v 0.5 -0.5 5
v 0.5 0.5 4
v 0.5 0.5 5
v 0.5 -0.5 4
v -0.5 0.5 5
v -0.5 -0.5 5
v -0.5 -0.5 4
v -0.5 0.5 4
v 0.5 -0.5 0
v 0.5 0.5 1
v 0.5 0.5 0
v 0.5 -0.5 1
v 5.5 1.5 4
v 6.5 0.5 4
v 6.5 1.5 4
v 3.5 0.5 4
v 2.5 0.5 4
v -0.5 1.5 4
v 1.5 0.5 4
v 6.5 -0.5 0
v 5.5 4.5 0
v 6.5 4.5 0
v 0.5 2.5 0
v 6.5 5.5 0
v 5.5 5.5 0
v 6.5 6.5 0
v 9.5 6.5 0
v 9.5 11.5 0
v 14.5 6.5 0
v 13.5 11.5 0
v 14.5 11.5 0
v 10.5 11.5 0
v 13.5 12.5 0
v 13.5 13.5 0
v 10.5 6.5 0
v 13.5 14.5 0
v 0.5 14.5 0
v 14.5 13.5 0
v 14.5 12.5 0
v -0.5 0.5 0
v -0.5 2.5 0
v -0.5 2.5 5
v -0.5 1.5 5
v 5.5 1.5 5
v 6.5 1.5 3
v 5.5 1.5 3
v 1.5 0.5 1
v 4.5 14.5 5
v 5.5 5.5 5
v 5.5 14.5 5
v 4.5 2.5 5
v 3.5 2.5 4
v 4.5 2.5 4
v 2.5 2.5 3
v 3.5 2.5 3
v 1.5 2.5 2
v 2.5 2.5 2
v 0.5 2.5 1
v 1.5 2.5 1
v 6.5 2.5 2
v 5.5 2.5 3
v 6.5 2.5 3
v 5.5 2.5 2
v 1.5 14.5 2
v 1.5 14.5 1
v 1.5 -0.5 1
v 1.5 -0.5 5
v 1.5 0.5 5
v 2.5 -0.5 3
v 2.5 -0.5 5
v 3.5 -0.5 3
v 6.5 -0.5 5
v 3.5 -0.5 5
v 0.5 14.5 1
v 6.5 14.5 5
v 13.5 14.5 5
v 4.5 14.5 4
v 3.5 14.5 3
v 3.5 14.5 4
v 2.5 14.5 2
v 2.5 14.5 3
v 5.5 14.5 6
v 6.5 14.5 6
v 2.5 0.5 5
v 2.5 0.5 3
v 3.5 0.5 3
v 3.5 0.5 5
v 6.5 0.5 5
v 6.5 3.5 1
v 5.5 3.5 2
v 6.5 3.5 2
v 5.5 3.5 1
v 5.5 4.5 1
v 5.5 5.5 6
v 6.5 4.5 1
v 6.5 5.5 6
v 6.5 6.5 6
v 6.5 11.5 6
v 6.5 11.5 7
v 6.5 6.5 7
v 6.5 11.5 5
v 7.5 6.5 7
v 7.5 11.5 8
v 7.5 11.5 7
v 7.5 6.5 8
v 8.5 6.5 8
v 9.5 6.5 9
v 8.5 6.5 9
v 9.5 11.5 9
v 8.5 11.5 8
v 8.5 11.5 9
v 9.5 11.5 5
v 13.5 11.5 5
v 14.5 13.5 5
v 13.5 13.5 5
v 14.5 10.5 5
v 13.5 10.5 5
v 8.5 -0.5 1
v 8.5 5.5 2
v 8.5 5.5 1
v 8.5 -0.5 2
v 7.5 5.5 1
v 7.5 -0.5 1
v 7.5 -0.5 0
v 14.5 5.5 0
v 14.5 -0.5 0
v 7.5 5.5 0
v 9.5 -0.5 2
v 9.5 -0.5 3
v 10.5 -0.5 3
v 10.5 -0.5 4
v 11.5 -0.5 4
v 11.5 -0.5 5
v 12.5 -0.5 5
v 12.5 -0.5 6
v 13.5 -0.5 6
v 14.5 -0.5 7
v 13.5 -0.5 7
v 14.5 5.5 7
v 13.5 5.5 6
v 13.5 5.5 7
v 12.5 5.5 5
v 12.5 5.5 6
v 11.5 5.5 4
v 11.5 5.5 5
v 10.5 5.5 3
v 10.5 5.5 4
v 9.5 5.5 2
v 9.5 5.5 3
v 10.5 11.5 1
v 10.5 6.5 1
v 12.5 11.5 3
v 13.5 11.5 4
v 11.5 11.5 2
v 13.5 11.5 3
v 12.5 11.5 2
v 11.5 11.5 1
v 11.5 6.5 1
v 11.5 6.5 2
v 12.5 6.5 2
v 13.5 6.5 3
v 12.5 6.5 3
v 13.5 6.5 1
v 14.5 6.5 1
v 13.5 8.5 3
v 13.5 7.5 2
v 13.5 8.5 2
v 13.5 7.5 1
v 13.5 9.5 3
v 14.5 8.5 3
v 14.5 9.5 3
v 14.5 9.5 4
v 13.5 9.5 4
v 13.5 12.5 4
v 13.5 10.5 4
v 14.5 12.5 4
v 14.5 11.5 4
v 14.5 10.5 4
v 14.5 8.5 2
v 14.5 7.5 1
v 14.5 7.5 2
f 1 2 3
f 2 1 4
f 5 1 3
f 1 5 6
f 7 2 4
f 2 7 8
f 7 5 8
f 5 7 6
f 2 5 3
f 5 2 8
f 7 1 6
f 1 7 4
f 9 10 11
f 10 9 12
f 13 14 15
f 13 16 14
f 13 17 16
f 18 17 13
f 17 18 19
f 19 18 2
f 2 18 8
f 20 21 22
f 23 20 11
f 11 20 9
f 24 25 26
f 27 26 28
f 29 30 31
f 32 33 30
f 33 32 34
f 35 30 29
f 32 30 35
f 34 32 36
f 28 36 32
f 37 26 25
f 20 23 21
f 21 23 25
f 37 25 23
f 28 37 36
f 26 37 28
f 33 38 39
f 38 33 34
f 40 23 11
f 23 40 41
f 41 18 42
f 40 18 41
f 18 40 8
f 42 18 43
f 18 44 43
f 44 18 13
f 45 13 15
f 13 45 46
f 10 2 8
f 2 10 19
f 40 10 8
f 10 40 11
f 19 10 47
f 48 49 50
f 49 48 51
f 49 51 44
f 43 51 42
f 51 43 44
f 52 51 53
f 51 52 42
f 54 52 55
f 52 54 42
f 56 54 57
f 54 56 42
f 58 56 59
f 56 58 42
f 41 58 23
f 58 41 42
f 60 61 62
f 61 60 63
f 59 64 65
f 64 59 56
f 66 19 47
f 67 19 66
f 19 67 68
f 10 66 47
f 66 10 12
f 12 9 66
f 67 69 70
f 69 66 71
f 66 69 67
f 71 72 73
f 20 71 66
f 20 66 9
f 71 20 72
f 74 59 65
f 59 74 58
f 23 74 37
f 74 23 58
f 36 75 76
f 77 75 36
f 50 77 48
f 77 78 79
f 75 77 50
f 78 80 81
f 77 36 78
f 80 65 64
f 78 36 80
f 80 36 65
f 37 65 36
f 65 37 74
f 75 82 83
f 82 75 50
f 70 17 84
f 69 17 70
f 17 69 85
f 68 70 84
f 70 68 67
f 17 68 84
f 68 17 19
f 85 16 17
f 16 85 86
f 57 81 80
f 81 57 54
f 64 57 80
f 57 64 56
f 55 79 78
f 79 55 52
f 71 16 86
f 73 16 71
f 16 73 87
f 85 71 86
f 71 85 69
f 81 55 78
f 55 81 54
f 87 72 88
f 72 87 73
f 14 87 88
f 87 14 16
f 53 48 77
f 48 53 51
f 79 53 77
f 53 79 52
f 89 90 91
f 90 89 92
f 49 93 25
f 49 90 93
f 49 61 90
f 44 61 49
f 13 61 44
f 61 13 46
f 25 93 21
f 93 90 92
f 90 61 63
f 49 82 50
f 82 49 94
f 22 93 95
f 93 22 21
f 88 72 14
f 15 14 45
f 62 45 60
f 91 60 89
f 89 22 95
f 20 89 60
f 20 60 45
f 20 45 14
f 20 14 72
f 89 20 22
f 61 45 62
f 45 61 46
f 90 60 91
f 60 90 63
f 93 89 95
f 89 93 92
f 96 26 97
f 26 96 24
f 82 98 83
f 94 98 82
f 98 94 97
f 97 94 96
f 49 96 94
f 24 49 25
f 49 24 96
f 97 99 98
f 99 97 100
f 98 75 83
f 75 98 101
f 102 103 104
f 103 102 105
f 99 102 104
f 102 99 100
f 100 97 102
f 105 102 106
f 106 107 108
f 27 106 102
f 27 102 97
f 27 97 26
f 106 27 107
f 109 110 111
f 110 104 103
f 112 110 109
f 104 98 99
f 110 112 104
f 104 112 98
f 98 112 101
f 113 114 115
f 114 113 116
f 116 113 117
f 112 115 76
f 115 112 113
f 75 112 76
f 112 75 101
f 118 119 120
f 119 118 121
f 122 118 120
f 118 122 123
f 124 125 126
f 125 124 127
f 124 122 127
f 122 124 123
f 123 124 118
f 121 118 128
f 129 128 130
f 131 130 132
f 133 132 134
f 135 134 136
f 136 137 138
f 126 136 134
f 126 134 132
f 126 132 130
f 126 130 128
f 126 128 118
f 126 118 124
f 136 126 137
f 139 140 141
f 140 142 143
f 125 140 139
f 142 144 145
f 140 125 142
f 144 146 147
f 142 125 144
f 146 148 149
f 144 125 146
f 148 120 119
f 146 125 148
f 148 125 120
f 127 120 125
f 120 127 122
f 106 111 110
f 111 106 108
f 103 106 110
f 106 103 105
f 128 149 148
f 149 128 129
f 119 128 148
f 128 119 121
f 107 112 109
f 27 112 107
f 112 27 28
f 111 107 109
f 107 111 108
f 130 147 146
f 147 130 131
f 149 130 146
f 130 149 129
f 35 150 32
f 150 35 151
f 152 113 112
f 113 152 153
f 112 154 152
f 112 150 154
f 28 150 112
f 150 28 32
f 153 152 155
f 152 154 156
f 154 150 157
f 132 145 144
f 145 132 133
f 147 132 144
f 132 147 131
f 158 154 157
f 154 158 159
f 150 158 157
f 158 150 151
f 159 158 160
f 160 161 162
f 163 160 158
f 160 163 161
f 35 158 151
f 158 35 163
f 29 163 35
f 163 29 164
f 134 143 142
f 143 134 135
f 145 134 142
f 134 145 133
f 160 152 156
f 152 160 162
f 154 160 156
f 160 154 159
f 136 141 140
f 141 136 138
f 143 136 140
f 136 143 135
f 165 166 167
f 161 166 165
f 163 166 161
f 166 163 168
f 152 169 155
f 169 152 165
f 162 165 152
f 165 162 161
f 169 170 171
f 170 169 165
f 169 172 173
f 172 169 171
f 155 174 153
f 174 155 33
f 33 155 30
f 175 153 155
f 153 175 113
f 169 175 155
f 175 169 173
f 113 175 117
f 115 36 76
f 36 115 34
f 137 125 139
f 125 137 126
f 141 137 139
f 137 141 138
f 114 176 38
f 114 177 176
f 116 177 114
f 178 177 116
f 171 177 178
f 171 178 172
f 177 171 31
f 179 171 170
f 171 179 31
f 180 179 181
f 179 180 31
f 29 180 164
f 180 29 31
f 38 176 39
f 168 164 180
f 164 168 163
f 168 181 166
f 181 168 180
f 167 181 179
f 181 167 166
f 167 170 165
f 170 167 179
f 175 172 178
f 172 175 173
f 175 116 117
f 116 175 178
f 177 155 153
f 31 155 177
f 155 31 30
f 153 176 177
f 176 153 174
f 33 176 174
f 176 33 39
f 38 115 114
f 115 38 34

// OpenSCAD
union() {
    translate([0, 0, 4.5]) color([1, 0, 0]) cube([1, 1, 1], center=true);
    translate([0, 1, 2.0]) cube([1, 1, 4], center=true);
    translate([0, 2, 2.5]) cube([1, 1, 5], center=true);
    translate([1, 0, 0.5]) cube([1, 1, 1], center=true);
    translate([1, 1, 2.0]) cube([1, 1, 4], center=true);
    translate([1, 2, 2.5]) cube([1, 1, 5], center=true);
    translate([1, 3, 0.5]) cube([1, 1, 1], center=true);
    translate([1, 4, 0.5]) cube([1, 1, 1], center=true);
    translate([1, 5, 0.5]) cube([1, 1, 1], center=true);
    translate([1, 6, 0.5]) cube([1, 1, 1], center=true);
    translate([1, 7, 0.5]) cube([1, 1, 1], center=true);
    translate([1, 8, 0.5]) cube([1, 1, 1], center=true);
    translate([1, 9, 0.5]) cube([1, 1, 1], center=true);
    translate([1, 10, 0.5]) cube([1, 1, 1], center=true);
    translate([1, 11, 0.5]) cube([1, 1, 1], center=true);
    translate([1, 12, 0.5]) cube([1, 1, 1], center=true);
    translate([1, 13, 0.5]) cube([1, 1, 1], center=true);
    translate([1, 14, 0.5]) cube([1, 1, 1], center=true);
    translate([2, 0, 2.5]) cube([1, 1, 5], center=true);
    translate([2, 1, 2.0]) cube([1, 1, 4], center=true);
    translate([2, 2, 2.5]) cube([1, 1, 5], center=true);
    translate([2, 3, 1.0]) cube([1, 1, 2], center=true);
    translate([2, 4, 1.0]) cube([1, 1, 2], center=true);
    translate([2, 5, 1.0]) cube([1, 1, 2], center=true);
    translate([2, 6, 1.0]) cube([1, 1, 2], center=true);
    translate([2, 7, 1.0]) cube([1, 1, 2], center=true);
    translate([2, 8, 1.0]) cube([1, 1, 2], center=true);
    translate([2, 9, 1.0]) cube([1, 1, 2], center=true);
    translate([2, 10, 1.0]) cube([1, 1, 2], center=true);
    translate([2, 11, 1.0]) cube([1, 1, 2], center=true);
    translate([2, 12, 1.0]) cube([1, 1, 2], center=true);
    translate([2, 13, 1.0]) cube([1, 1, 2], center=true);
    translate([2, 14, 1.0]) cube([1, 1, 2], center=true);
    translate([3, 0, 1.5]) cube([1, 1, 3], center=true);
    translate([3, 1, 2.0]) cube([1, 1, 4], center=true);
    translate([3, 2, 2.5]) cube([1, 1, 5], center=true);
    translate([3, 3, 1.5]) cube([1, 1, 3], center=true);
    translate([3, 4, 1.5]) cube([1, 1, 3], center=true);
    translate([3, 5, 1.5]) cube([1, 1, 3], center=true);
    translate([3, 6, 1.5]) cube([1, 1, 3], center=true);
    translate([3, 7, 1.5]) cube([1, 1, 3], center=true);
    translate([3, 8, 1.5]) cube([1, 1, 3], center=true);
    translate([3, 9, 1.5]) cube([1, 1, 3], center=true);
    translate([3, 10, 1.5]) cube([1, 1, 3], center=true);
    translate([3, 11, 1.5]) cube([1, 1, 3], center=true);
    translate([3, 12, 1.5]) cube([1, 1, 3], center=true);
    translate([3, 13, 1.5]) cube([1, 1, 3], center=true);
    translate([3, 14, 1.5]) cube([1, 1, 3], center=true);
    translate([4, 0, 2.5]) cube([1, 1, 5], center=true);
    translate([4, 1, 2.0]) cube([1, 1, 4], center=true);
    translate([4, 2, 2.5]) cube([1, 1, 5], center=true);
    translate([4, 3, 2.0]) cube([1, 1, 4], center=true);
    translate([4, 4, 2.0]) cube([1, 1, 4], center=true);
    translate([4, 5, 2.0]) cube([1, 1, 4], center=true);
    translate([4, 6, 2.0]) cube([1, 1, 4], center=true);
    translate([4, 7, 2.0]) cube([1, 1, 4], center=true);
    translate([4, 8, 2.0]) cube([1, 1, 4], center=true);
    translate([4, 9, 2.0]) cube([1, 1, 4], center=true);
    translate([4, 10, 2.0]) cube([1, 1, 4], center=true);
    translate([4, 11, 2.0]) cube([1, 1, 4], center=true);
    translate([4, 12, 2.0]) cube([1, 1, 4], center=true);
    translate([4, 13, 2.0]) cube([1, 1, 4], center=true);
    translate([4, 14, 2.0]) cube([1, 1, 4], center=true);
    translate([5, 0, 2.5]) cube([1, 1, 5], center=true);
    translate([5, 1, 2.0]) cube([1, 1, 4], center=true);
    translate([5, 2, 2.5]) cube([1, 1, 5], center=true);
    translate([5, 3, 2.5]) cube([1, 1, 5], center=true);
    translate([5, 4, 2.5]) cube([1, 1, 5], center=true);
    translate([5, 5, 2.5]) cube([1, 1, 5], center=true);
    translate([5, 6, 2.5]) cube([1, 1, 5], center=true);
    translate([5, 7, 2.5]) cube([1, 1, 5], center=true);
    translate([5, 8, 2.5]) cube([1, 1, 5], center=true);
    translate([5, 9, 2.5]) cube([1, 1, 5], center=true);
    translate([5, 10, 2.5]) cube([1, 1, 5], center=true);
    translate([5, 11, 2.5]) cube([1, 1, 5], center=true);
    translate([5, 12, 2.5]) cube([1, 1, 5], center=true);
    translate([5, 13, 2.5]) cube([1, 1, 5], center=true);
    translate([5, 14, 2.5]) cube([1, 1, 5], center=true);
    translate([6, 0, 2.5]) cube([1, 1, 5], center=true);
    translate([6, 1, 2.0]) cube([1, 1, 4], center=true);
    translate([6, 2, 1.5]) cube([1, 1, 3], center=true);
    translate([6, 3, 1.0]) cube([1, 1, 2], center=true);
    translate([6, 4, 0.5]) cube([1, 1, 1], center=true);
    translate([6, 6, 3.0]) cube([1, 1, 6], center=true);
    translate([6, 7, 3.0]) cube([1, 1, 6], center=true);
    translate([6, 8, 3.0]) cube([1, 1, 6], center=true);
    translate([6, 9, 3.0]) cube([1, 1, 6], center=true);
    translate([6, 10, 3.0]) cube([1, 1, 6], center=true);
    translate([6, 11, 3.0]) cube([1, 1, 6], center=true);
    translate([6, 12, 3.0]) cube([1, 1, 6], center=true);
    translate([6, 13, 3.0]) cube([1, 1, 6], center=true);
    translate([6, 14, 3.0]) cube([1, 1, 6], center=true);
    translate([7, 7, 3.5]) cube([1, 1, 7], center=true);
    translate([7, 8, 3.5]) cube([1, 1, 7], center=true);
    translate([7, 9, 3.5]) cube([1, 1, 7], center=true);
    translate([7, 10, 3.5]) cube([1, 1, 7], center=true);
    translate([7, 11, 3.5]) cube([1, 1, 7], center=true);
    translate([7, 12, 2.5]) cube([1, 1, 5], center=true);
    translate([7, 13, 2.5]) cube([1, 1, 5], center=true);
    translate([7, 14, 2.5]) cube([1, 1, 5], center=true);
    translate([8, 0, 0.5]) cube([1, 1, 1], center=true);
    translate([8, 1, 0.5]) cube([1, 1, 1], center=true);
    translate([8, 2, 0.5]) cube([1, 1, 1], center=true);
    translate([8, 3, 0.5]) cube([1, 1, 1], center=true);
    translate([8, 4, 0.5]) cube([1, 1, 1], center=true);
    translate([8, 5, 0.5]) cube([1, 1, 1], center=true);
    translate([8, 7, 4.0]) cube([1, 1, 8], center=true);
    translate([8, 8, 4.0]) cube([1, 1, 8], center=true);
    translate([8, 9, 4.0]) cube([1, 1, 8], center=true);
    translate([8, 10, 4.0]) cube([1, 1, 8], center=true);
    translate([8, 11, 4.0]) cube([1, 1, 8], center=true);
    translate([8, 12, 2.5]) cube([1, 1, 5], center=true);
    translate([8, 13, 2.5]) cube([1, 1, 5], center=true);
    translate([8, 14, 2.5]) cube([1, 1, 5], center=true);
    translate([9, 0, 1.0]) cube([1, 1, 2], center=true);
    translate([9, 1, 1.0]) cube([1, 1, 2], center=true);
    translate([9, 2, 1.0]) cube([1, 1, 2], center=true);
    translate([9, 3, 1.0]) cube([1, 1, 2], center=true);
    translate([9, 4, 1.0]) cube([1, 1, 2], center=true);
    translate([9, 5, 1.0]) cube([1, 1, 2], center=true);
    translate([9, 7, 4.5]) cube([1, 1, 9], center=true);
    translate([9, 8, 4.5]) cube([1, 1, 9], center=true);
    translate([9, 9, 4.5]) cube([1, 1, 9], center=true);
    translate([9, 10, 4.5]) cube([1, 1, 9], center=true);
    translate([9, 11, 4.5]) cube([1, 1, 9], center=true);
    translate([9, 12, 2.5]) cube([1, 1, 5], center=true);
    translate([9, 13, 2.5]) cube([1, 1, 5], center=true);
    translate([9, 14, 2.5]) cube([1, 1, 5], center=true);
    translate([10, 0, 1.5]) cube([1, 1, 3], center=true);
    translate([10, 1, 1.5]) cube([1, 1, 3], center=true);
    translate([10, 2, 1.5]) cube([1, 1, 3], center=true);
    translate([10, 3, 1.5]) cube([1, 1, 3], center=true);
    translate([10, 4, 1.5]) cube([1, 1, 3], center=true);
    translate([10, 5, 1.5]) cube([1, 1, 3], center=true);
    translate([10, 12, 2.5]) cube([1, 1, 5], center=true);
    translate([10, 13, 2.5]) cube([1, 1, 5], center=true);
    translate([10, 14, 2.5]) cube([1, 1, 5], center=true);
    translate([11, 0, 2.0]) cube([1, 1, 4], center=true);
    translate([11, 1, 2.0]) cube([1, 1, 4], center=true);
    translate([11, 2, 2.0]) cube([1, 1, 4], center=true);
    translate([11, 3, 2.0]) cube([1, 1, 4], center=true);
    translate([11, 4, 2.0]) cube([1, 1, 4], center=true);
    translate([11, 5, 2.0]) cube([1, 1, 4], center=true);
    translate([11, 7, 0.5]) cube([1, 1, 1], center=true);
    translate([11, 8, 0.5]) cube([1, 1, 1], center=true);
    translate([11, 9, 0.5]) cube([1, 1, 1], center=true);
    translate([11, 10, 0.5]) cube([1, 1, 1], center=true);
    translate([11, 11, 0.5]) cube([1, 1, 1], center=true);
    translate([11, 12, 2.5]) cube([1, 1, 5], center=true);
    translate([11, 13, 2.5]) cube([1, 1, 5], center=true);
    translate([11, 14, 2.5]) cube([1, 1, 5], center=true);
    translate([12, 0, 2.5]) cube([1, 1, 5], center=true);
    translate([12, 1, 2.5]) cube([1, 1, 5], center=true);
    translate([12, 2, 2.5]) cube([1, 1, 5], center=true);
    translate([12, 3, 2.5]) cube([1, 1, 5], center=true);
    translate([12, 4, 2.5]) cube([1, 1, 5], center=true);
    translate([12, 5, 2.5]) cube([1, 1, 5], center=true);
    translate([12, 7, 1.0]) cube([1, 1, 2], center=true);
    translate([12, 8, 1.0]) cube([1, 1, 2], center=true);
    translate([12, 9, 1.0]) cube([1, 1, 2], center=true);
    translate([12, 10, 1.0]) cube([1, 1, 2], center=true);
    translate([12, 11, 1.0]) cube([1, 1, 2], center=true);
    translate([12, 12, 2.5]) cube([1, 1, 5], center=true);
    translate([12, 13, 2.5]) cube([1, 1, 5], center=true);
    translate([12, 14, 2.5]) cube([1, 1, 5], center=true);
    translate([13, 0, 3.0]) cube([1, 1, 6], center=true);
    translate([13, 1, 3.0]) cube([1, 1, 6], center=true);
    translate([13, 2, 3.0]) cube([1, 1, 6], center=true);
    translate([13, 3, 3.0]) cube([1, 1, 6], center=true);
    translate([13, 4, 3.0]) cube([1, 1, 6], center=true);
    translate([13, 5, 3.0]) cube([1, 1, 6], center=true);
    translate([13, 7, 1.5]) cube([1, 1, 3], center=true);
    translate([13, 8, 1.5]) cube([1, 1, 3], center=true);
    translate([13, 9, 1.5]) cube([1, 1, 3], center=true);
    translate([13, 10, 1.5]) cube([1, 1, 3], center=true);
    translate([13, 11, 1.5]) cube([1, 1, 3], center=true);
    translate([13, 12, 2.5]) cube([1, 1, 5], center=true);
    translate([13, 13, 2.5]) cube([1, 1, 5], center=true);
    translate([13, 14, 2.5]) cube([1, 1, 5], center=true);
    translate([14, 0, 3.5]) cube([1, 1, 7], center=true);
    translate([14, 1, 3.5]) cube([1, 1, 7], center=true);
    translate([14, 2, 3.5]) cube([1, 1, 7], center=true);
    translate([14, 3, 3.5]) cube([1, 1, 7], center=true);
    translate([14, 4, 3.5]) cube([1, 1, 7], center=true);
    translate([14, 5, 3.5]) cube([1, 1, 7], center=true);
    translate([14, 7, 0.5]) cube([1, 1, 1], center=true);
    translate([14, 8, 1.0]) cube([1, 1, 2], center=true);
    translate([14, 9, 1.5]) cube([1, 1, 3], center=true);
    translate([14, 10, 2.0]) cube([1, 1, 4], center=true);
    translate([14, 11, 2.5]) cube([1, 1, 5], center=true);
    translate([14, 12, 4.5]) color([0, 0, 1]) cube([1, 1, 1], center=true);
    translate([14, 13, 2.5]) cube([1, 1, 5], center=true);
}
